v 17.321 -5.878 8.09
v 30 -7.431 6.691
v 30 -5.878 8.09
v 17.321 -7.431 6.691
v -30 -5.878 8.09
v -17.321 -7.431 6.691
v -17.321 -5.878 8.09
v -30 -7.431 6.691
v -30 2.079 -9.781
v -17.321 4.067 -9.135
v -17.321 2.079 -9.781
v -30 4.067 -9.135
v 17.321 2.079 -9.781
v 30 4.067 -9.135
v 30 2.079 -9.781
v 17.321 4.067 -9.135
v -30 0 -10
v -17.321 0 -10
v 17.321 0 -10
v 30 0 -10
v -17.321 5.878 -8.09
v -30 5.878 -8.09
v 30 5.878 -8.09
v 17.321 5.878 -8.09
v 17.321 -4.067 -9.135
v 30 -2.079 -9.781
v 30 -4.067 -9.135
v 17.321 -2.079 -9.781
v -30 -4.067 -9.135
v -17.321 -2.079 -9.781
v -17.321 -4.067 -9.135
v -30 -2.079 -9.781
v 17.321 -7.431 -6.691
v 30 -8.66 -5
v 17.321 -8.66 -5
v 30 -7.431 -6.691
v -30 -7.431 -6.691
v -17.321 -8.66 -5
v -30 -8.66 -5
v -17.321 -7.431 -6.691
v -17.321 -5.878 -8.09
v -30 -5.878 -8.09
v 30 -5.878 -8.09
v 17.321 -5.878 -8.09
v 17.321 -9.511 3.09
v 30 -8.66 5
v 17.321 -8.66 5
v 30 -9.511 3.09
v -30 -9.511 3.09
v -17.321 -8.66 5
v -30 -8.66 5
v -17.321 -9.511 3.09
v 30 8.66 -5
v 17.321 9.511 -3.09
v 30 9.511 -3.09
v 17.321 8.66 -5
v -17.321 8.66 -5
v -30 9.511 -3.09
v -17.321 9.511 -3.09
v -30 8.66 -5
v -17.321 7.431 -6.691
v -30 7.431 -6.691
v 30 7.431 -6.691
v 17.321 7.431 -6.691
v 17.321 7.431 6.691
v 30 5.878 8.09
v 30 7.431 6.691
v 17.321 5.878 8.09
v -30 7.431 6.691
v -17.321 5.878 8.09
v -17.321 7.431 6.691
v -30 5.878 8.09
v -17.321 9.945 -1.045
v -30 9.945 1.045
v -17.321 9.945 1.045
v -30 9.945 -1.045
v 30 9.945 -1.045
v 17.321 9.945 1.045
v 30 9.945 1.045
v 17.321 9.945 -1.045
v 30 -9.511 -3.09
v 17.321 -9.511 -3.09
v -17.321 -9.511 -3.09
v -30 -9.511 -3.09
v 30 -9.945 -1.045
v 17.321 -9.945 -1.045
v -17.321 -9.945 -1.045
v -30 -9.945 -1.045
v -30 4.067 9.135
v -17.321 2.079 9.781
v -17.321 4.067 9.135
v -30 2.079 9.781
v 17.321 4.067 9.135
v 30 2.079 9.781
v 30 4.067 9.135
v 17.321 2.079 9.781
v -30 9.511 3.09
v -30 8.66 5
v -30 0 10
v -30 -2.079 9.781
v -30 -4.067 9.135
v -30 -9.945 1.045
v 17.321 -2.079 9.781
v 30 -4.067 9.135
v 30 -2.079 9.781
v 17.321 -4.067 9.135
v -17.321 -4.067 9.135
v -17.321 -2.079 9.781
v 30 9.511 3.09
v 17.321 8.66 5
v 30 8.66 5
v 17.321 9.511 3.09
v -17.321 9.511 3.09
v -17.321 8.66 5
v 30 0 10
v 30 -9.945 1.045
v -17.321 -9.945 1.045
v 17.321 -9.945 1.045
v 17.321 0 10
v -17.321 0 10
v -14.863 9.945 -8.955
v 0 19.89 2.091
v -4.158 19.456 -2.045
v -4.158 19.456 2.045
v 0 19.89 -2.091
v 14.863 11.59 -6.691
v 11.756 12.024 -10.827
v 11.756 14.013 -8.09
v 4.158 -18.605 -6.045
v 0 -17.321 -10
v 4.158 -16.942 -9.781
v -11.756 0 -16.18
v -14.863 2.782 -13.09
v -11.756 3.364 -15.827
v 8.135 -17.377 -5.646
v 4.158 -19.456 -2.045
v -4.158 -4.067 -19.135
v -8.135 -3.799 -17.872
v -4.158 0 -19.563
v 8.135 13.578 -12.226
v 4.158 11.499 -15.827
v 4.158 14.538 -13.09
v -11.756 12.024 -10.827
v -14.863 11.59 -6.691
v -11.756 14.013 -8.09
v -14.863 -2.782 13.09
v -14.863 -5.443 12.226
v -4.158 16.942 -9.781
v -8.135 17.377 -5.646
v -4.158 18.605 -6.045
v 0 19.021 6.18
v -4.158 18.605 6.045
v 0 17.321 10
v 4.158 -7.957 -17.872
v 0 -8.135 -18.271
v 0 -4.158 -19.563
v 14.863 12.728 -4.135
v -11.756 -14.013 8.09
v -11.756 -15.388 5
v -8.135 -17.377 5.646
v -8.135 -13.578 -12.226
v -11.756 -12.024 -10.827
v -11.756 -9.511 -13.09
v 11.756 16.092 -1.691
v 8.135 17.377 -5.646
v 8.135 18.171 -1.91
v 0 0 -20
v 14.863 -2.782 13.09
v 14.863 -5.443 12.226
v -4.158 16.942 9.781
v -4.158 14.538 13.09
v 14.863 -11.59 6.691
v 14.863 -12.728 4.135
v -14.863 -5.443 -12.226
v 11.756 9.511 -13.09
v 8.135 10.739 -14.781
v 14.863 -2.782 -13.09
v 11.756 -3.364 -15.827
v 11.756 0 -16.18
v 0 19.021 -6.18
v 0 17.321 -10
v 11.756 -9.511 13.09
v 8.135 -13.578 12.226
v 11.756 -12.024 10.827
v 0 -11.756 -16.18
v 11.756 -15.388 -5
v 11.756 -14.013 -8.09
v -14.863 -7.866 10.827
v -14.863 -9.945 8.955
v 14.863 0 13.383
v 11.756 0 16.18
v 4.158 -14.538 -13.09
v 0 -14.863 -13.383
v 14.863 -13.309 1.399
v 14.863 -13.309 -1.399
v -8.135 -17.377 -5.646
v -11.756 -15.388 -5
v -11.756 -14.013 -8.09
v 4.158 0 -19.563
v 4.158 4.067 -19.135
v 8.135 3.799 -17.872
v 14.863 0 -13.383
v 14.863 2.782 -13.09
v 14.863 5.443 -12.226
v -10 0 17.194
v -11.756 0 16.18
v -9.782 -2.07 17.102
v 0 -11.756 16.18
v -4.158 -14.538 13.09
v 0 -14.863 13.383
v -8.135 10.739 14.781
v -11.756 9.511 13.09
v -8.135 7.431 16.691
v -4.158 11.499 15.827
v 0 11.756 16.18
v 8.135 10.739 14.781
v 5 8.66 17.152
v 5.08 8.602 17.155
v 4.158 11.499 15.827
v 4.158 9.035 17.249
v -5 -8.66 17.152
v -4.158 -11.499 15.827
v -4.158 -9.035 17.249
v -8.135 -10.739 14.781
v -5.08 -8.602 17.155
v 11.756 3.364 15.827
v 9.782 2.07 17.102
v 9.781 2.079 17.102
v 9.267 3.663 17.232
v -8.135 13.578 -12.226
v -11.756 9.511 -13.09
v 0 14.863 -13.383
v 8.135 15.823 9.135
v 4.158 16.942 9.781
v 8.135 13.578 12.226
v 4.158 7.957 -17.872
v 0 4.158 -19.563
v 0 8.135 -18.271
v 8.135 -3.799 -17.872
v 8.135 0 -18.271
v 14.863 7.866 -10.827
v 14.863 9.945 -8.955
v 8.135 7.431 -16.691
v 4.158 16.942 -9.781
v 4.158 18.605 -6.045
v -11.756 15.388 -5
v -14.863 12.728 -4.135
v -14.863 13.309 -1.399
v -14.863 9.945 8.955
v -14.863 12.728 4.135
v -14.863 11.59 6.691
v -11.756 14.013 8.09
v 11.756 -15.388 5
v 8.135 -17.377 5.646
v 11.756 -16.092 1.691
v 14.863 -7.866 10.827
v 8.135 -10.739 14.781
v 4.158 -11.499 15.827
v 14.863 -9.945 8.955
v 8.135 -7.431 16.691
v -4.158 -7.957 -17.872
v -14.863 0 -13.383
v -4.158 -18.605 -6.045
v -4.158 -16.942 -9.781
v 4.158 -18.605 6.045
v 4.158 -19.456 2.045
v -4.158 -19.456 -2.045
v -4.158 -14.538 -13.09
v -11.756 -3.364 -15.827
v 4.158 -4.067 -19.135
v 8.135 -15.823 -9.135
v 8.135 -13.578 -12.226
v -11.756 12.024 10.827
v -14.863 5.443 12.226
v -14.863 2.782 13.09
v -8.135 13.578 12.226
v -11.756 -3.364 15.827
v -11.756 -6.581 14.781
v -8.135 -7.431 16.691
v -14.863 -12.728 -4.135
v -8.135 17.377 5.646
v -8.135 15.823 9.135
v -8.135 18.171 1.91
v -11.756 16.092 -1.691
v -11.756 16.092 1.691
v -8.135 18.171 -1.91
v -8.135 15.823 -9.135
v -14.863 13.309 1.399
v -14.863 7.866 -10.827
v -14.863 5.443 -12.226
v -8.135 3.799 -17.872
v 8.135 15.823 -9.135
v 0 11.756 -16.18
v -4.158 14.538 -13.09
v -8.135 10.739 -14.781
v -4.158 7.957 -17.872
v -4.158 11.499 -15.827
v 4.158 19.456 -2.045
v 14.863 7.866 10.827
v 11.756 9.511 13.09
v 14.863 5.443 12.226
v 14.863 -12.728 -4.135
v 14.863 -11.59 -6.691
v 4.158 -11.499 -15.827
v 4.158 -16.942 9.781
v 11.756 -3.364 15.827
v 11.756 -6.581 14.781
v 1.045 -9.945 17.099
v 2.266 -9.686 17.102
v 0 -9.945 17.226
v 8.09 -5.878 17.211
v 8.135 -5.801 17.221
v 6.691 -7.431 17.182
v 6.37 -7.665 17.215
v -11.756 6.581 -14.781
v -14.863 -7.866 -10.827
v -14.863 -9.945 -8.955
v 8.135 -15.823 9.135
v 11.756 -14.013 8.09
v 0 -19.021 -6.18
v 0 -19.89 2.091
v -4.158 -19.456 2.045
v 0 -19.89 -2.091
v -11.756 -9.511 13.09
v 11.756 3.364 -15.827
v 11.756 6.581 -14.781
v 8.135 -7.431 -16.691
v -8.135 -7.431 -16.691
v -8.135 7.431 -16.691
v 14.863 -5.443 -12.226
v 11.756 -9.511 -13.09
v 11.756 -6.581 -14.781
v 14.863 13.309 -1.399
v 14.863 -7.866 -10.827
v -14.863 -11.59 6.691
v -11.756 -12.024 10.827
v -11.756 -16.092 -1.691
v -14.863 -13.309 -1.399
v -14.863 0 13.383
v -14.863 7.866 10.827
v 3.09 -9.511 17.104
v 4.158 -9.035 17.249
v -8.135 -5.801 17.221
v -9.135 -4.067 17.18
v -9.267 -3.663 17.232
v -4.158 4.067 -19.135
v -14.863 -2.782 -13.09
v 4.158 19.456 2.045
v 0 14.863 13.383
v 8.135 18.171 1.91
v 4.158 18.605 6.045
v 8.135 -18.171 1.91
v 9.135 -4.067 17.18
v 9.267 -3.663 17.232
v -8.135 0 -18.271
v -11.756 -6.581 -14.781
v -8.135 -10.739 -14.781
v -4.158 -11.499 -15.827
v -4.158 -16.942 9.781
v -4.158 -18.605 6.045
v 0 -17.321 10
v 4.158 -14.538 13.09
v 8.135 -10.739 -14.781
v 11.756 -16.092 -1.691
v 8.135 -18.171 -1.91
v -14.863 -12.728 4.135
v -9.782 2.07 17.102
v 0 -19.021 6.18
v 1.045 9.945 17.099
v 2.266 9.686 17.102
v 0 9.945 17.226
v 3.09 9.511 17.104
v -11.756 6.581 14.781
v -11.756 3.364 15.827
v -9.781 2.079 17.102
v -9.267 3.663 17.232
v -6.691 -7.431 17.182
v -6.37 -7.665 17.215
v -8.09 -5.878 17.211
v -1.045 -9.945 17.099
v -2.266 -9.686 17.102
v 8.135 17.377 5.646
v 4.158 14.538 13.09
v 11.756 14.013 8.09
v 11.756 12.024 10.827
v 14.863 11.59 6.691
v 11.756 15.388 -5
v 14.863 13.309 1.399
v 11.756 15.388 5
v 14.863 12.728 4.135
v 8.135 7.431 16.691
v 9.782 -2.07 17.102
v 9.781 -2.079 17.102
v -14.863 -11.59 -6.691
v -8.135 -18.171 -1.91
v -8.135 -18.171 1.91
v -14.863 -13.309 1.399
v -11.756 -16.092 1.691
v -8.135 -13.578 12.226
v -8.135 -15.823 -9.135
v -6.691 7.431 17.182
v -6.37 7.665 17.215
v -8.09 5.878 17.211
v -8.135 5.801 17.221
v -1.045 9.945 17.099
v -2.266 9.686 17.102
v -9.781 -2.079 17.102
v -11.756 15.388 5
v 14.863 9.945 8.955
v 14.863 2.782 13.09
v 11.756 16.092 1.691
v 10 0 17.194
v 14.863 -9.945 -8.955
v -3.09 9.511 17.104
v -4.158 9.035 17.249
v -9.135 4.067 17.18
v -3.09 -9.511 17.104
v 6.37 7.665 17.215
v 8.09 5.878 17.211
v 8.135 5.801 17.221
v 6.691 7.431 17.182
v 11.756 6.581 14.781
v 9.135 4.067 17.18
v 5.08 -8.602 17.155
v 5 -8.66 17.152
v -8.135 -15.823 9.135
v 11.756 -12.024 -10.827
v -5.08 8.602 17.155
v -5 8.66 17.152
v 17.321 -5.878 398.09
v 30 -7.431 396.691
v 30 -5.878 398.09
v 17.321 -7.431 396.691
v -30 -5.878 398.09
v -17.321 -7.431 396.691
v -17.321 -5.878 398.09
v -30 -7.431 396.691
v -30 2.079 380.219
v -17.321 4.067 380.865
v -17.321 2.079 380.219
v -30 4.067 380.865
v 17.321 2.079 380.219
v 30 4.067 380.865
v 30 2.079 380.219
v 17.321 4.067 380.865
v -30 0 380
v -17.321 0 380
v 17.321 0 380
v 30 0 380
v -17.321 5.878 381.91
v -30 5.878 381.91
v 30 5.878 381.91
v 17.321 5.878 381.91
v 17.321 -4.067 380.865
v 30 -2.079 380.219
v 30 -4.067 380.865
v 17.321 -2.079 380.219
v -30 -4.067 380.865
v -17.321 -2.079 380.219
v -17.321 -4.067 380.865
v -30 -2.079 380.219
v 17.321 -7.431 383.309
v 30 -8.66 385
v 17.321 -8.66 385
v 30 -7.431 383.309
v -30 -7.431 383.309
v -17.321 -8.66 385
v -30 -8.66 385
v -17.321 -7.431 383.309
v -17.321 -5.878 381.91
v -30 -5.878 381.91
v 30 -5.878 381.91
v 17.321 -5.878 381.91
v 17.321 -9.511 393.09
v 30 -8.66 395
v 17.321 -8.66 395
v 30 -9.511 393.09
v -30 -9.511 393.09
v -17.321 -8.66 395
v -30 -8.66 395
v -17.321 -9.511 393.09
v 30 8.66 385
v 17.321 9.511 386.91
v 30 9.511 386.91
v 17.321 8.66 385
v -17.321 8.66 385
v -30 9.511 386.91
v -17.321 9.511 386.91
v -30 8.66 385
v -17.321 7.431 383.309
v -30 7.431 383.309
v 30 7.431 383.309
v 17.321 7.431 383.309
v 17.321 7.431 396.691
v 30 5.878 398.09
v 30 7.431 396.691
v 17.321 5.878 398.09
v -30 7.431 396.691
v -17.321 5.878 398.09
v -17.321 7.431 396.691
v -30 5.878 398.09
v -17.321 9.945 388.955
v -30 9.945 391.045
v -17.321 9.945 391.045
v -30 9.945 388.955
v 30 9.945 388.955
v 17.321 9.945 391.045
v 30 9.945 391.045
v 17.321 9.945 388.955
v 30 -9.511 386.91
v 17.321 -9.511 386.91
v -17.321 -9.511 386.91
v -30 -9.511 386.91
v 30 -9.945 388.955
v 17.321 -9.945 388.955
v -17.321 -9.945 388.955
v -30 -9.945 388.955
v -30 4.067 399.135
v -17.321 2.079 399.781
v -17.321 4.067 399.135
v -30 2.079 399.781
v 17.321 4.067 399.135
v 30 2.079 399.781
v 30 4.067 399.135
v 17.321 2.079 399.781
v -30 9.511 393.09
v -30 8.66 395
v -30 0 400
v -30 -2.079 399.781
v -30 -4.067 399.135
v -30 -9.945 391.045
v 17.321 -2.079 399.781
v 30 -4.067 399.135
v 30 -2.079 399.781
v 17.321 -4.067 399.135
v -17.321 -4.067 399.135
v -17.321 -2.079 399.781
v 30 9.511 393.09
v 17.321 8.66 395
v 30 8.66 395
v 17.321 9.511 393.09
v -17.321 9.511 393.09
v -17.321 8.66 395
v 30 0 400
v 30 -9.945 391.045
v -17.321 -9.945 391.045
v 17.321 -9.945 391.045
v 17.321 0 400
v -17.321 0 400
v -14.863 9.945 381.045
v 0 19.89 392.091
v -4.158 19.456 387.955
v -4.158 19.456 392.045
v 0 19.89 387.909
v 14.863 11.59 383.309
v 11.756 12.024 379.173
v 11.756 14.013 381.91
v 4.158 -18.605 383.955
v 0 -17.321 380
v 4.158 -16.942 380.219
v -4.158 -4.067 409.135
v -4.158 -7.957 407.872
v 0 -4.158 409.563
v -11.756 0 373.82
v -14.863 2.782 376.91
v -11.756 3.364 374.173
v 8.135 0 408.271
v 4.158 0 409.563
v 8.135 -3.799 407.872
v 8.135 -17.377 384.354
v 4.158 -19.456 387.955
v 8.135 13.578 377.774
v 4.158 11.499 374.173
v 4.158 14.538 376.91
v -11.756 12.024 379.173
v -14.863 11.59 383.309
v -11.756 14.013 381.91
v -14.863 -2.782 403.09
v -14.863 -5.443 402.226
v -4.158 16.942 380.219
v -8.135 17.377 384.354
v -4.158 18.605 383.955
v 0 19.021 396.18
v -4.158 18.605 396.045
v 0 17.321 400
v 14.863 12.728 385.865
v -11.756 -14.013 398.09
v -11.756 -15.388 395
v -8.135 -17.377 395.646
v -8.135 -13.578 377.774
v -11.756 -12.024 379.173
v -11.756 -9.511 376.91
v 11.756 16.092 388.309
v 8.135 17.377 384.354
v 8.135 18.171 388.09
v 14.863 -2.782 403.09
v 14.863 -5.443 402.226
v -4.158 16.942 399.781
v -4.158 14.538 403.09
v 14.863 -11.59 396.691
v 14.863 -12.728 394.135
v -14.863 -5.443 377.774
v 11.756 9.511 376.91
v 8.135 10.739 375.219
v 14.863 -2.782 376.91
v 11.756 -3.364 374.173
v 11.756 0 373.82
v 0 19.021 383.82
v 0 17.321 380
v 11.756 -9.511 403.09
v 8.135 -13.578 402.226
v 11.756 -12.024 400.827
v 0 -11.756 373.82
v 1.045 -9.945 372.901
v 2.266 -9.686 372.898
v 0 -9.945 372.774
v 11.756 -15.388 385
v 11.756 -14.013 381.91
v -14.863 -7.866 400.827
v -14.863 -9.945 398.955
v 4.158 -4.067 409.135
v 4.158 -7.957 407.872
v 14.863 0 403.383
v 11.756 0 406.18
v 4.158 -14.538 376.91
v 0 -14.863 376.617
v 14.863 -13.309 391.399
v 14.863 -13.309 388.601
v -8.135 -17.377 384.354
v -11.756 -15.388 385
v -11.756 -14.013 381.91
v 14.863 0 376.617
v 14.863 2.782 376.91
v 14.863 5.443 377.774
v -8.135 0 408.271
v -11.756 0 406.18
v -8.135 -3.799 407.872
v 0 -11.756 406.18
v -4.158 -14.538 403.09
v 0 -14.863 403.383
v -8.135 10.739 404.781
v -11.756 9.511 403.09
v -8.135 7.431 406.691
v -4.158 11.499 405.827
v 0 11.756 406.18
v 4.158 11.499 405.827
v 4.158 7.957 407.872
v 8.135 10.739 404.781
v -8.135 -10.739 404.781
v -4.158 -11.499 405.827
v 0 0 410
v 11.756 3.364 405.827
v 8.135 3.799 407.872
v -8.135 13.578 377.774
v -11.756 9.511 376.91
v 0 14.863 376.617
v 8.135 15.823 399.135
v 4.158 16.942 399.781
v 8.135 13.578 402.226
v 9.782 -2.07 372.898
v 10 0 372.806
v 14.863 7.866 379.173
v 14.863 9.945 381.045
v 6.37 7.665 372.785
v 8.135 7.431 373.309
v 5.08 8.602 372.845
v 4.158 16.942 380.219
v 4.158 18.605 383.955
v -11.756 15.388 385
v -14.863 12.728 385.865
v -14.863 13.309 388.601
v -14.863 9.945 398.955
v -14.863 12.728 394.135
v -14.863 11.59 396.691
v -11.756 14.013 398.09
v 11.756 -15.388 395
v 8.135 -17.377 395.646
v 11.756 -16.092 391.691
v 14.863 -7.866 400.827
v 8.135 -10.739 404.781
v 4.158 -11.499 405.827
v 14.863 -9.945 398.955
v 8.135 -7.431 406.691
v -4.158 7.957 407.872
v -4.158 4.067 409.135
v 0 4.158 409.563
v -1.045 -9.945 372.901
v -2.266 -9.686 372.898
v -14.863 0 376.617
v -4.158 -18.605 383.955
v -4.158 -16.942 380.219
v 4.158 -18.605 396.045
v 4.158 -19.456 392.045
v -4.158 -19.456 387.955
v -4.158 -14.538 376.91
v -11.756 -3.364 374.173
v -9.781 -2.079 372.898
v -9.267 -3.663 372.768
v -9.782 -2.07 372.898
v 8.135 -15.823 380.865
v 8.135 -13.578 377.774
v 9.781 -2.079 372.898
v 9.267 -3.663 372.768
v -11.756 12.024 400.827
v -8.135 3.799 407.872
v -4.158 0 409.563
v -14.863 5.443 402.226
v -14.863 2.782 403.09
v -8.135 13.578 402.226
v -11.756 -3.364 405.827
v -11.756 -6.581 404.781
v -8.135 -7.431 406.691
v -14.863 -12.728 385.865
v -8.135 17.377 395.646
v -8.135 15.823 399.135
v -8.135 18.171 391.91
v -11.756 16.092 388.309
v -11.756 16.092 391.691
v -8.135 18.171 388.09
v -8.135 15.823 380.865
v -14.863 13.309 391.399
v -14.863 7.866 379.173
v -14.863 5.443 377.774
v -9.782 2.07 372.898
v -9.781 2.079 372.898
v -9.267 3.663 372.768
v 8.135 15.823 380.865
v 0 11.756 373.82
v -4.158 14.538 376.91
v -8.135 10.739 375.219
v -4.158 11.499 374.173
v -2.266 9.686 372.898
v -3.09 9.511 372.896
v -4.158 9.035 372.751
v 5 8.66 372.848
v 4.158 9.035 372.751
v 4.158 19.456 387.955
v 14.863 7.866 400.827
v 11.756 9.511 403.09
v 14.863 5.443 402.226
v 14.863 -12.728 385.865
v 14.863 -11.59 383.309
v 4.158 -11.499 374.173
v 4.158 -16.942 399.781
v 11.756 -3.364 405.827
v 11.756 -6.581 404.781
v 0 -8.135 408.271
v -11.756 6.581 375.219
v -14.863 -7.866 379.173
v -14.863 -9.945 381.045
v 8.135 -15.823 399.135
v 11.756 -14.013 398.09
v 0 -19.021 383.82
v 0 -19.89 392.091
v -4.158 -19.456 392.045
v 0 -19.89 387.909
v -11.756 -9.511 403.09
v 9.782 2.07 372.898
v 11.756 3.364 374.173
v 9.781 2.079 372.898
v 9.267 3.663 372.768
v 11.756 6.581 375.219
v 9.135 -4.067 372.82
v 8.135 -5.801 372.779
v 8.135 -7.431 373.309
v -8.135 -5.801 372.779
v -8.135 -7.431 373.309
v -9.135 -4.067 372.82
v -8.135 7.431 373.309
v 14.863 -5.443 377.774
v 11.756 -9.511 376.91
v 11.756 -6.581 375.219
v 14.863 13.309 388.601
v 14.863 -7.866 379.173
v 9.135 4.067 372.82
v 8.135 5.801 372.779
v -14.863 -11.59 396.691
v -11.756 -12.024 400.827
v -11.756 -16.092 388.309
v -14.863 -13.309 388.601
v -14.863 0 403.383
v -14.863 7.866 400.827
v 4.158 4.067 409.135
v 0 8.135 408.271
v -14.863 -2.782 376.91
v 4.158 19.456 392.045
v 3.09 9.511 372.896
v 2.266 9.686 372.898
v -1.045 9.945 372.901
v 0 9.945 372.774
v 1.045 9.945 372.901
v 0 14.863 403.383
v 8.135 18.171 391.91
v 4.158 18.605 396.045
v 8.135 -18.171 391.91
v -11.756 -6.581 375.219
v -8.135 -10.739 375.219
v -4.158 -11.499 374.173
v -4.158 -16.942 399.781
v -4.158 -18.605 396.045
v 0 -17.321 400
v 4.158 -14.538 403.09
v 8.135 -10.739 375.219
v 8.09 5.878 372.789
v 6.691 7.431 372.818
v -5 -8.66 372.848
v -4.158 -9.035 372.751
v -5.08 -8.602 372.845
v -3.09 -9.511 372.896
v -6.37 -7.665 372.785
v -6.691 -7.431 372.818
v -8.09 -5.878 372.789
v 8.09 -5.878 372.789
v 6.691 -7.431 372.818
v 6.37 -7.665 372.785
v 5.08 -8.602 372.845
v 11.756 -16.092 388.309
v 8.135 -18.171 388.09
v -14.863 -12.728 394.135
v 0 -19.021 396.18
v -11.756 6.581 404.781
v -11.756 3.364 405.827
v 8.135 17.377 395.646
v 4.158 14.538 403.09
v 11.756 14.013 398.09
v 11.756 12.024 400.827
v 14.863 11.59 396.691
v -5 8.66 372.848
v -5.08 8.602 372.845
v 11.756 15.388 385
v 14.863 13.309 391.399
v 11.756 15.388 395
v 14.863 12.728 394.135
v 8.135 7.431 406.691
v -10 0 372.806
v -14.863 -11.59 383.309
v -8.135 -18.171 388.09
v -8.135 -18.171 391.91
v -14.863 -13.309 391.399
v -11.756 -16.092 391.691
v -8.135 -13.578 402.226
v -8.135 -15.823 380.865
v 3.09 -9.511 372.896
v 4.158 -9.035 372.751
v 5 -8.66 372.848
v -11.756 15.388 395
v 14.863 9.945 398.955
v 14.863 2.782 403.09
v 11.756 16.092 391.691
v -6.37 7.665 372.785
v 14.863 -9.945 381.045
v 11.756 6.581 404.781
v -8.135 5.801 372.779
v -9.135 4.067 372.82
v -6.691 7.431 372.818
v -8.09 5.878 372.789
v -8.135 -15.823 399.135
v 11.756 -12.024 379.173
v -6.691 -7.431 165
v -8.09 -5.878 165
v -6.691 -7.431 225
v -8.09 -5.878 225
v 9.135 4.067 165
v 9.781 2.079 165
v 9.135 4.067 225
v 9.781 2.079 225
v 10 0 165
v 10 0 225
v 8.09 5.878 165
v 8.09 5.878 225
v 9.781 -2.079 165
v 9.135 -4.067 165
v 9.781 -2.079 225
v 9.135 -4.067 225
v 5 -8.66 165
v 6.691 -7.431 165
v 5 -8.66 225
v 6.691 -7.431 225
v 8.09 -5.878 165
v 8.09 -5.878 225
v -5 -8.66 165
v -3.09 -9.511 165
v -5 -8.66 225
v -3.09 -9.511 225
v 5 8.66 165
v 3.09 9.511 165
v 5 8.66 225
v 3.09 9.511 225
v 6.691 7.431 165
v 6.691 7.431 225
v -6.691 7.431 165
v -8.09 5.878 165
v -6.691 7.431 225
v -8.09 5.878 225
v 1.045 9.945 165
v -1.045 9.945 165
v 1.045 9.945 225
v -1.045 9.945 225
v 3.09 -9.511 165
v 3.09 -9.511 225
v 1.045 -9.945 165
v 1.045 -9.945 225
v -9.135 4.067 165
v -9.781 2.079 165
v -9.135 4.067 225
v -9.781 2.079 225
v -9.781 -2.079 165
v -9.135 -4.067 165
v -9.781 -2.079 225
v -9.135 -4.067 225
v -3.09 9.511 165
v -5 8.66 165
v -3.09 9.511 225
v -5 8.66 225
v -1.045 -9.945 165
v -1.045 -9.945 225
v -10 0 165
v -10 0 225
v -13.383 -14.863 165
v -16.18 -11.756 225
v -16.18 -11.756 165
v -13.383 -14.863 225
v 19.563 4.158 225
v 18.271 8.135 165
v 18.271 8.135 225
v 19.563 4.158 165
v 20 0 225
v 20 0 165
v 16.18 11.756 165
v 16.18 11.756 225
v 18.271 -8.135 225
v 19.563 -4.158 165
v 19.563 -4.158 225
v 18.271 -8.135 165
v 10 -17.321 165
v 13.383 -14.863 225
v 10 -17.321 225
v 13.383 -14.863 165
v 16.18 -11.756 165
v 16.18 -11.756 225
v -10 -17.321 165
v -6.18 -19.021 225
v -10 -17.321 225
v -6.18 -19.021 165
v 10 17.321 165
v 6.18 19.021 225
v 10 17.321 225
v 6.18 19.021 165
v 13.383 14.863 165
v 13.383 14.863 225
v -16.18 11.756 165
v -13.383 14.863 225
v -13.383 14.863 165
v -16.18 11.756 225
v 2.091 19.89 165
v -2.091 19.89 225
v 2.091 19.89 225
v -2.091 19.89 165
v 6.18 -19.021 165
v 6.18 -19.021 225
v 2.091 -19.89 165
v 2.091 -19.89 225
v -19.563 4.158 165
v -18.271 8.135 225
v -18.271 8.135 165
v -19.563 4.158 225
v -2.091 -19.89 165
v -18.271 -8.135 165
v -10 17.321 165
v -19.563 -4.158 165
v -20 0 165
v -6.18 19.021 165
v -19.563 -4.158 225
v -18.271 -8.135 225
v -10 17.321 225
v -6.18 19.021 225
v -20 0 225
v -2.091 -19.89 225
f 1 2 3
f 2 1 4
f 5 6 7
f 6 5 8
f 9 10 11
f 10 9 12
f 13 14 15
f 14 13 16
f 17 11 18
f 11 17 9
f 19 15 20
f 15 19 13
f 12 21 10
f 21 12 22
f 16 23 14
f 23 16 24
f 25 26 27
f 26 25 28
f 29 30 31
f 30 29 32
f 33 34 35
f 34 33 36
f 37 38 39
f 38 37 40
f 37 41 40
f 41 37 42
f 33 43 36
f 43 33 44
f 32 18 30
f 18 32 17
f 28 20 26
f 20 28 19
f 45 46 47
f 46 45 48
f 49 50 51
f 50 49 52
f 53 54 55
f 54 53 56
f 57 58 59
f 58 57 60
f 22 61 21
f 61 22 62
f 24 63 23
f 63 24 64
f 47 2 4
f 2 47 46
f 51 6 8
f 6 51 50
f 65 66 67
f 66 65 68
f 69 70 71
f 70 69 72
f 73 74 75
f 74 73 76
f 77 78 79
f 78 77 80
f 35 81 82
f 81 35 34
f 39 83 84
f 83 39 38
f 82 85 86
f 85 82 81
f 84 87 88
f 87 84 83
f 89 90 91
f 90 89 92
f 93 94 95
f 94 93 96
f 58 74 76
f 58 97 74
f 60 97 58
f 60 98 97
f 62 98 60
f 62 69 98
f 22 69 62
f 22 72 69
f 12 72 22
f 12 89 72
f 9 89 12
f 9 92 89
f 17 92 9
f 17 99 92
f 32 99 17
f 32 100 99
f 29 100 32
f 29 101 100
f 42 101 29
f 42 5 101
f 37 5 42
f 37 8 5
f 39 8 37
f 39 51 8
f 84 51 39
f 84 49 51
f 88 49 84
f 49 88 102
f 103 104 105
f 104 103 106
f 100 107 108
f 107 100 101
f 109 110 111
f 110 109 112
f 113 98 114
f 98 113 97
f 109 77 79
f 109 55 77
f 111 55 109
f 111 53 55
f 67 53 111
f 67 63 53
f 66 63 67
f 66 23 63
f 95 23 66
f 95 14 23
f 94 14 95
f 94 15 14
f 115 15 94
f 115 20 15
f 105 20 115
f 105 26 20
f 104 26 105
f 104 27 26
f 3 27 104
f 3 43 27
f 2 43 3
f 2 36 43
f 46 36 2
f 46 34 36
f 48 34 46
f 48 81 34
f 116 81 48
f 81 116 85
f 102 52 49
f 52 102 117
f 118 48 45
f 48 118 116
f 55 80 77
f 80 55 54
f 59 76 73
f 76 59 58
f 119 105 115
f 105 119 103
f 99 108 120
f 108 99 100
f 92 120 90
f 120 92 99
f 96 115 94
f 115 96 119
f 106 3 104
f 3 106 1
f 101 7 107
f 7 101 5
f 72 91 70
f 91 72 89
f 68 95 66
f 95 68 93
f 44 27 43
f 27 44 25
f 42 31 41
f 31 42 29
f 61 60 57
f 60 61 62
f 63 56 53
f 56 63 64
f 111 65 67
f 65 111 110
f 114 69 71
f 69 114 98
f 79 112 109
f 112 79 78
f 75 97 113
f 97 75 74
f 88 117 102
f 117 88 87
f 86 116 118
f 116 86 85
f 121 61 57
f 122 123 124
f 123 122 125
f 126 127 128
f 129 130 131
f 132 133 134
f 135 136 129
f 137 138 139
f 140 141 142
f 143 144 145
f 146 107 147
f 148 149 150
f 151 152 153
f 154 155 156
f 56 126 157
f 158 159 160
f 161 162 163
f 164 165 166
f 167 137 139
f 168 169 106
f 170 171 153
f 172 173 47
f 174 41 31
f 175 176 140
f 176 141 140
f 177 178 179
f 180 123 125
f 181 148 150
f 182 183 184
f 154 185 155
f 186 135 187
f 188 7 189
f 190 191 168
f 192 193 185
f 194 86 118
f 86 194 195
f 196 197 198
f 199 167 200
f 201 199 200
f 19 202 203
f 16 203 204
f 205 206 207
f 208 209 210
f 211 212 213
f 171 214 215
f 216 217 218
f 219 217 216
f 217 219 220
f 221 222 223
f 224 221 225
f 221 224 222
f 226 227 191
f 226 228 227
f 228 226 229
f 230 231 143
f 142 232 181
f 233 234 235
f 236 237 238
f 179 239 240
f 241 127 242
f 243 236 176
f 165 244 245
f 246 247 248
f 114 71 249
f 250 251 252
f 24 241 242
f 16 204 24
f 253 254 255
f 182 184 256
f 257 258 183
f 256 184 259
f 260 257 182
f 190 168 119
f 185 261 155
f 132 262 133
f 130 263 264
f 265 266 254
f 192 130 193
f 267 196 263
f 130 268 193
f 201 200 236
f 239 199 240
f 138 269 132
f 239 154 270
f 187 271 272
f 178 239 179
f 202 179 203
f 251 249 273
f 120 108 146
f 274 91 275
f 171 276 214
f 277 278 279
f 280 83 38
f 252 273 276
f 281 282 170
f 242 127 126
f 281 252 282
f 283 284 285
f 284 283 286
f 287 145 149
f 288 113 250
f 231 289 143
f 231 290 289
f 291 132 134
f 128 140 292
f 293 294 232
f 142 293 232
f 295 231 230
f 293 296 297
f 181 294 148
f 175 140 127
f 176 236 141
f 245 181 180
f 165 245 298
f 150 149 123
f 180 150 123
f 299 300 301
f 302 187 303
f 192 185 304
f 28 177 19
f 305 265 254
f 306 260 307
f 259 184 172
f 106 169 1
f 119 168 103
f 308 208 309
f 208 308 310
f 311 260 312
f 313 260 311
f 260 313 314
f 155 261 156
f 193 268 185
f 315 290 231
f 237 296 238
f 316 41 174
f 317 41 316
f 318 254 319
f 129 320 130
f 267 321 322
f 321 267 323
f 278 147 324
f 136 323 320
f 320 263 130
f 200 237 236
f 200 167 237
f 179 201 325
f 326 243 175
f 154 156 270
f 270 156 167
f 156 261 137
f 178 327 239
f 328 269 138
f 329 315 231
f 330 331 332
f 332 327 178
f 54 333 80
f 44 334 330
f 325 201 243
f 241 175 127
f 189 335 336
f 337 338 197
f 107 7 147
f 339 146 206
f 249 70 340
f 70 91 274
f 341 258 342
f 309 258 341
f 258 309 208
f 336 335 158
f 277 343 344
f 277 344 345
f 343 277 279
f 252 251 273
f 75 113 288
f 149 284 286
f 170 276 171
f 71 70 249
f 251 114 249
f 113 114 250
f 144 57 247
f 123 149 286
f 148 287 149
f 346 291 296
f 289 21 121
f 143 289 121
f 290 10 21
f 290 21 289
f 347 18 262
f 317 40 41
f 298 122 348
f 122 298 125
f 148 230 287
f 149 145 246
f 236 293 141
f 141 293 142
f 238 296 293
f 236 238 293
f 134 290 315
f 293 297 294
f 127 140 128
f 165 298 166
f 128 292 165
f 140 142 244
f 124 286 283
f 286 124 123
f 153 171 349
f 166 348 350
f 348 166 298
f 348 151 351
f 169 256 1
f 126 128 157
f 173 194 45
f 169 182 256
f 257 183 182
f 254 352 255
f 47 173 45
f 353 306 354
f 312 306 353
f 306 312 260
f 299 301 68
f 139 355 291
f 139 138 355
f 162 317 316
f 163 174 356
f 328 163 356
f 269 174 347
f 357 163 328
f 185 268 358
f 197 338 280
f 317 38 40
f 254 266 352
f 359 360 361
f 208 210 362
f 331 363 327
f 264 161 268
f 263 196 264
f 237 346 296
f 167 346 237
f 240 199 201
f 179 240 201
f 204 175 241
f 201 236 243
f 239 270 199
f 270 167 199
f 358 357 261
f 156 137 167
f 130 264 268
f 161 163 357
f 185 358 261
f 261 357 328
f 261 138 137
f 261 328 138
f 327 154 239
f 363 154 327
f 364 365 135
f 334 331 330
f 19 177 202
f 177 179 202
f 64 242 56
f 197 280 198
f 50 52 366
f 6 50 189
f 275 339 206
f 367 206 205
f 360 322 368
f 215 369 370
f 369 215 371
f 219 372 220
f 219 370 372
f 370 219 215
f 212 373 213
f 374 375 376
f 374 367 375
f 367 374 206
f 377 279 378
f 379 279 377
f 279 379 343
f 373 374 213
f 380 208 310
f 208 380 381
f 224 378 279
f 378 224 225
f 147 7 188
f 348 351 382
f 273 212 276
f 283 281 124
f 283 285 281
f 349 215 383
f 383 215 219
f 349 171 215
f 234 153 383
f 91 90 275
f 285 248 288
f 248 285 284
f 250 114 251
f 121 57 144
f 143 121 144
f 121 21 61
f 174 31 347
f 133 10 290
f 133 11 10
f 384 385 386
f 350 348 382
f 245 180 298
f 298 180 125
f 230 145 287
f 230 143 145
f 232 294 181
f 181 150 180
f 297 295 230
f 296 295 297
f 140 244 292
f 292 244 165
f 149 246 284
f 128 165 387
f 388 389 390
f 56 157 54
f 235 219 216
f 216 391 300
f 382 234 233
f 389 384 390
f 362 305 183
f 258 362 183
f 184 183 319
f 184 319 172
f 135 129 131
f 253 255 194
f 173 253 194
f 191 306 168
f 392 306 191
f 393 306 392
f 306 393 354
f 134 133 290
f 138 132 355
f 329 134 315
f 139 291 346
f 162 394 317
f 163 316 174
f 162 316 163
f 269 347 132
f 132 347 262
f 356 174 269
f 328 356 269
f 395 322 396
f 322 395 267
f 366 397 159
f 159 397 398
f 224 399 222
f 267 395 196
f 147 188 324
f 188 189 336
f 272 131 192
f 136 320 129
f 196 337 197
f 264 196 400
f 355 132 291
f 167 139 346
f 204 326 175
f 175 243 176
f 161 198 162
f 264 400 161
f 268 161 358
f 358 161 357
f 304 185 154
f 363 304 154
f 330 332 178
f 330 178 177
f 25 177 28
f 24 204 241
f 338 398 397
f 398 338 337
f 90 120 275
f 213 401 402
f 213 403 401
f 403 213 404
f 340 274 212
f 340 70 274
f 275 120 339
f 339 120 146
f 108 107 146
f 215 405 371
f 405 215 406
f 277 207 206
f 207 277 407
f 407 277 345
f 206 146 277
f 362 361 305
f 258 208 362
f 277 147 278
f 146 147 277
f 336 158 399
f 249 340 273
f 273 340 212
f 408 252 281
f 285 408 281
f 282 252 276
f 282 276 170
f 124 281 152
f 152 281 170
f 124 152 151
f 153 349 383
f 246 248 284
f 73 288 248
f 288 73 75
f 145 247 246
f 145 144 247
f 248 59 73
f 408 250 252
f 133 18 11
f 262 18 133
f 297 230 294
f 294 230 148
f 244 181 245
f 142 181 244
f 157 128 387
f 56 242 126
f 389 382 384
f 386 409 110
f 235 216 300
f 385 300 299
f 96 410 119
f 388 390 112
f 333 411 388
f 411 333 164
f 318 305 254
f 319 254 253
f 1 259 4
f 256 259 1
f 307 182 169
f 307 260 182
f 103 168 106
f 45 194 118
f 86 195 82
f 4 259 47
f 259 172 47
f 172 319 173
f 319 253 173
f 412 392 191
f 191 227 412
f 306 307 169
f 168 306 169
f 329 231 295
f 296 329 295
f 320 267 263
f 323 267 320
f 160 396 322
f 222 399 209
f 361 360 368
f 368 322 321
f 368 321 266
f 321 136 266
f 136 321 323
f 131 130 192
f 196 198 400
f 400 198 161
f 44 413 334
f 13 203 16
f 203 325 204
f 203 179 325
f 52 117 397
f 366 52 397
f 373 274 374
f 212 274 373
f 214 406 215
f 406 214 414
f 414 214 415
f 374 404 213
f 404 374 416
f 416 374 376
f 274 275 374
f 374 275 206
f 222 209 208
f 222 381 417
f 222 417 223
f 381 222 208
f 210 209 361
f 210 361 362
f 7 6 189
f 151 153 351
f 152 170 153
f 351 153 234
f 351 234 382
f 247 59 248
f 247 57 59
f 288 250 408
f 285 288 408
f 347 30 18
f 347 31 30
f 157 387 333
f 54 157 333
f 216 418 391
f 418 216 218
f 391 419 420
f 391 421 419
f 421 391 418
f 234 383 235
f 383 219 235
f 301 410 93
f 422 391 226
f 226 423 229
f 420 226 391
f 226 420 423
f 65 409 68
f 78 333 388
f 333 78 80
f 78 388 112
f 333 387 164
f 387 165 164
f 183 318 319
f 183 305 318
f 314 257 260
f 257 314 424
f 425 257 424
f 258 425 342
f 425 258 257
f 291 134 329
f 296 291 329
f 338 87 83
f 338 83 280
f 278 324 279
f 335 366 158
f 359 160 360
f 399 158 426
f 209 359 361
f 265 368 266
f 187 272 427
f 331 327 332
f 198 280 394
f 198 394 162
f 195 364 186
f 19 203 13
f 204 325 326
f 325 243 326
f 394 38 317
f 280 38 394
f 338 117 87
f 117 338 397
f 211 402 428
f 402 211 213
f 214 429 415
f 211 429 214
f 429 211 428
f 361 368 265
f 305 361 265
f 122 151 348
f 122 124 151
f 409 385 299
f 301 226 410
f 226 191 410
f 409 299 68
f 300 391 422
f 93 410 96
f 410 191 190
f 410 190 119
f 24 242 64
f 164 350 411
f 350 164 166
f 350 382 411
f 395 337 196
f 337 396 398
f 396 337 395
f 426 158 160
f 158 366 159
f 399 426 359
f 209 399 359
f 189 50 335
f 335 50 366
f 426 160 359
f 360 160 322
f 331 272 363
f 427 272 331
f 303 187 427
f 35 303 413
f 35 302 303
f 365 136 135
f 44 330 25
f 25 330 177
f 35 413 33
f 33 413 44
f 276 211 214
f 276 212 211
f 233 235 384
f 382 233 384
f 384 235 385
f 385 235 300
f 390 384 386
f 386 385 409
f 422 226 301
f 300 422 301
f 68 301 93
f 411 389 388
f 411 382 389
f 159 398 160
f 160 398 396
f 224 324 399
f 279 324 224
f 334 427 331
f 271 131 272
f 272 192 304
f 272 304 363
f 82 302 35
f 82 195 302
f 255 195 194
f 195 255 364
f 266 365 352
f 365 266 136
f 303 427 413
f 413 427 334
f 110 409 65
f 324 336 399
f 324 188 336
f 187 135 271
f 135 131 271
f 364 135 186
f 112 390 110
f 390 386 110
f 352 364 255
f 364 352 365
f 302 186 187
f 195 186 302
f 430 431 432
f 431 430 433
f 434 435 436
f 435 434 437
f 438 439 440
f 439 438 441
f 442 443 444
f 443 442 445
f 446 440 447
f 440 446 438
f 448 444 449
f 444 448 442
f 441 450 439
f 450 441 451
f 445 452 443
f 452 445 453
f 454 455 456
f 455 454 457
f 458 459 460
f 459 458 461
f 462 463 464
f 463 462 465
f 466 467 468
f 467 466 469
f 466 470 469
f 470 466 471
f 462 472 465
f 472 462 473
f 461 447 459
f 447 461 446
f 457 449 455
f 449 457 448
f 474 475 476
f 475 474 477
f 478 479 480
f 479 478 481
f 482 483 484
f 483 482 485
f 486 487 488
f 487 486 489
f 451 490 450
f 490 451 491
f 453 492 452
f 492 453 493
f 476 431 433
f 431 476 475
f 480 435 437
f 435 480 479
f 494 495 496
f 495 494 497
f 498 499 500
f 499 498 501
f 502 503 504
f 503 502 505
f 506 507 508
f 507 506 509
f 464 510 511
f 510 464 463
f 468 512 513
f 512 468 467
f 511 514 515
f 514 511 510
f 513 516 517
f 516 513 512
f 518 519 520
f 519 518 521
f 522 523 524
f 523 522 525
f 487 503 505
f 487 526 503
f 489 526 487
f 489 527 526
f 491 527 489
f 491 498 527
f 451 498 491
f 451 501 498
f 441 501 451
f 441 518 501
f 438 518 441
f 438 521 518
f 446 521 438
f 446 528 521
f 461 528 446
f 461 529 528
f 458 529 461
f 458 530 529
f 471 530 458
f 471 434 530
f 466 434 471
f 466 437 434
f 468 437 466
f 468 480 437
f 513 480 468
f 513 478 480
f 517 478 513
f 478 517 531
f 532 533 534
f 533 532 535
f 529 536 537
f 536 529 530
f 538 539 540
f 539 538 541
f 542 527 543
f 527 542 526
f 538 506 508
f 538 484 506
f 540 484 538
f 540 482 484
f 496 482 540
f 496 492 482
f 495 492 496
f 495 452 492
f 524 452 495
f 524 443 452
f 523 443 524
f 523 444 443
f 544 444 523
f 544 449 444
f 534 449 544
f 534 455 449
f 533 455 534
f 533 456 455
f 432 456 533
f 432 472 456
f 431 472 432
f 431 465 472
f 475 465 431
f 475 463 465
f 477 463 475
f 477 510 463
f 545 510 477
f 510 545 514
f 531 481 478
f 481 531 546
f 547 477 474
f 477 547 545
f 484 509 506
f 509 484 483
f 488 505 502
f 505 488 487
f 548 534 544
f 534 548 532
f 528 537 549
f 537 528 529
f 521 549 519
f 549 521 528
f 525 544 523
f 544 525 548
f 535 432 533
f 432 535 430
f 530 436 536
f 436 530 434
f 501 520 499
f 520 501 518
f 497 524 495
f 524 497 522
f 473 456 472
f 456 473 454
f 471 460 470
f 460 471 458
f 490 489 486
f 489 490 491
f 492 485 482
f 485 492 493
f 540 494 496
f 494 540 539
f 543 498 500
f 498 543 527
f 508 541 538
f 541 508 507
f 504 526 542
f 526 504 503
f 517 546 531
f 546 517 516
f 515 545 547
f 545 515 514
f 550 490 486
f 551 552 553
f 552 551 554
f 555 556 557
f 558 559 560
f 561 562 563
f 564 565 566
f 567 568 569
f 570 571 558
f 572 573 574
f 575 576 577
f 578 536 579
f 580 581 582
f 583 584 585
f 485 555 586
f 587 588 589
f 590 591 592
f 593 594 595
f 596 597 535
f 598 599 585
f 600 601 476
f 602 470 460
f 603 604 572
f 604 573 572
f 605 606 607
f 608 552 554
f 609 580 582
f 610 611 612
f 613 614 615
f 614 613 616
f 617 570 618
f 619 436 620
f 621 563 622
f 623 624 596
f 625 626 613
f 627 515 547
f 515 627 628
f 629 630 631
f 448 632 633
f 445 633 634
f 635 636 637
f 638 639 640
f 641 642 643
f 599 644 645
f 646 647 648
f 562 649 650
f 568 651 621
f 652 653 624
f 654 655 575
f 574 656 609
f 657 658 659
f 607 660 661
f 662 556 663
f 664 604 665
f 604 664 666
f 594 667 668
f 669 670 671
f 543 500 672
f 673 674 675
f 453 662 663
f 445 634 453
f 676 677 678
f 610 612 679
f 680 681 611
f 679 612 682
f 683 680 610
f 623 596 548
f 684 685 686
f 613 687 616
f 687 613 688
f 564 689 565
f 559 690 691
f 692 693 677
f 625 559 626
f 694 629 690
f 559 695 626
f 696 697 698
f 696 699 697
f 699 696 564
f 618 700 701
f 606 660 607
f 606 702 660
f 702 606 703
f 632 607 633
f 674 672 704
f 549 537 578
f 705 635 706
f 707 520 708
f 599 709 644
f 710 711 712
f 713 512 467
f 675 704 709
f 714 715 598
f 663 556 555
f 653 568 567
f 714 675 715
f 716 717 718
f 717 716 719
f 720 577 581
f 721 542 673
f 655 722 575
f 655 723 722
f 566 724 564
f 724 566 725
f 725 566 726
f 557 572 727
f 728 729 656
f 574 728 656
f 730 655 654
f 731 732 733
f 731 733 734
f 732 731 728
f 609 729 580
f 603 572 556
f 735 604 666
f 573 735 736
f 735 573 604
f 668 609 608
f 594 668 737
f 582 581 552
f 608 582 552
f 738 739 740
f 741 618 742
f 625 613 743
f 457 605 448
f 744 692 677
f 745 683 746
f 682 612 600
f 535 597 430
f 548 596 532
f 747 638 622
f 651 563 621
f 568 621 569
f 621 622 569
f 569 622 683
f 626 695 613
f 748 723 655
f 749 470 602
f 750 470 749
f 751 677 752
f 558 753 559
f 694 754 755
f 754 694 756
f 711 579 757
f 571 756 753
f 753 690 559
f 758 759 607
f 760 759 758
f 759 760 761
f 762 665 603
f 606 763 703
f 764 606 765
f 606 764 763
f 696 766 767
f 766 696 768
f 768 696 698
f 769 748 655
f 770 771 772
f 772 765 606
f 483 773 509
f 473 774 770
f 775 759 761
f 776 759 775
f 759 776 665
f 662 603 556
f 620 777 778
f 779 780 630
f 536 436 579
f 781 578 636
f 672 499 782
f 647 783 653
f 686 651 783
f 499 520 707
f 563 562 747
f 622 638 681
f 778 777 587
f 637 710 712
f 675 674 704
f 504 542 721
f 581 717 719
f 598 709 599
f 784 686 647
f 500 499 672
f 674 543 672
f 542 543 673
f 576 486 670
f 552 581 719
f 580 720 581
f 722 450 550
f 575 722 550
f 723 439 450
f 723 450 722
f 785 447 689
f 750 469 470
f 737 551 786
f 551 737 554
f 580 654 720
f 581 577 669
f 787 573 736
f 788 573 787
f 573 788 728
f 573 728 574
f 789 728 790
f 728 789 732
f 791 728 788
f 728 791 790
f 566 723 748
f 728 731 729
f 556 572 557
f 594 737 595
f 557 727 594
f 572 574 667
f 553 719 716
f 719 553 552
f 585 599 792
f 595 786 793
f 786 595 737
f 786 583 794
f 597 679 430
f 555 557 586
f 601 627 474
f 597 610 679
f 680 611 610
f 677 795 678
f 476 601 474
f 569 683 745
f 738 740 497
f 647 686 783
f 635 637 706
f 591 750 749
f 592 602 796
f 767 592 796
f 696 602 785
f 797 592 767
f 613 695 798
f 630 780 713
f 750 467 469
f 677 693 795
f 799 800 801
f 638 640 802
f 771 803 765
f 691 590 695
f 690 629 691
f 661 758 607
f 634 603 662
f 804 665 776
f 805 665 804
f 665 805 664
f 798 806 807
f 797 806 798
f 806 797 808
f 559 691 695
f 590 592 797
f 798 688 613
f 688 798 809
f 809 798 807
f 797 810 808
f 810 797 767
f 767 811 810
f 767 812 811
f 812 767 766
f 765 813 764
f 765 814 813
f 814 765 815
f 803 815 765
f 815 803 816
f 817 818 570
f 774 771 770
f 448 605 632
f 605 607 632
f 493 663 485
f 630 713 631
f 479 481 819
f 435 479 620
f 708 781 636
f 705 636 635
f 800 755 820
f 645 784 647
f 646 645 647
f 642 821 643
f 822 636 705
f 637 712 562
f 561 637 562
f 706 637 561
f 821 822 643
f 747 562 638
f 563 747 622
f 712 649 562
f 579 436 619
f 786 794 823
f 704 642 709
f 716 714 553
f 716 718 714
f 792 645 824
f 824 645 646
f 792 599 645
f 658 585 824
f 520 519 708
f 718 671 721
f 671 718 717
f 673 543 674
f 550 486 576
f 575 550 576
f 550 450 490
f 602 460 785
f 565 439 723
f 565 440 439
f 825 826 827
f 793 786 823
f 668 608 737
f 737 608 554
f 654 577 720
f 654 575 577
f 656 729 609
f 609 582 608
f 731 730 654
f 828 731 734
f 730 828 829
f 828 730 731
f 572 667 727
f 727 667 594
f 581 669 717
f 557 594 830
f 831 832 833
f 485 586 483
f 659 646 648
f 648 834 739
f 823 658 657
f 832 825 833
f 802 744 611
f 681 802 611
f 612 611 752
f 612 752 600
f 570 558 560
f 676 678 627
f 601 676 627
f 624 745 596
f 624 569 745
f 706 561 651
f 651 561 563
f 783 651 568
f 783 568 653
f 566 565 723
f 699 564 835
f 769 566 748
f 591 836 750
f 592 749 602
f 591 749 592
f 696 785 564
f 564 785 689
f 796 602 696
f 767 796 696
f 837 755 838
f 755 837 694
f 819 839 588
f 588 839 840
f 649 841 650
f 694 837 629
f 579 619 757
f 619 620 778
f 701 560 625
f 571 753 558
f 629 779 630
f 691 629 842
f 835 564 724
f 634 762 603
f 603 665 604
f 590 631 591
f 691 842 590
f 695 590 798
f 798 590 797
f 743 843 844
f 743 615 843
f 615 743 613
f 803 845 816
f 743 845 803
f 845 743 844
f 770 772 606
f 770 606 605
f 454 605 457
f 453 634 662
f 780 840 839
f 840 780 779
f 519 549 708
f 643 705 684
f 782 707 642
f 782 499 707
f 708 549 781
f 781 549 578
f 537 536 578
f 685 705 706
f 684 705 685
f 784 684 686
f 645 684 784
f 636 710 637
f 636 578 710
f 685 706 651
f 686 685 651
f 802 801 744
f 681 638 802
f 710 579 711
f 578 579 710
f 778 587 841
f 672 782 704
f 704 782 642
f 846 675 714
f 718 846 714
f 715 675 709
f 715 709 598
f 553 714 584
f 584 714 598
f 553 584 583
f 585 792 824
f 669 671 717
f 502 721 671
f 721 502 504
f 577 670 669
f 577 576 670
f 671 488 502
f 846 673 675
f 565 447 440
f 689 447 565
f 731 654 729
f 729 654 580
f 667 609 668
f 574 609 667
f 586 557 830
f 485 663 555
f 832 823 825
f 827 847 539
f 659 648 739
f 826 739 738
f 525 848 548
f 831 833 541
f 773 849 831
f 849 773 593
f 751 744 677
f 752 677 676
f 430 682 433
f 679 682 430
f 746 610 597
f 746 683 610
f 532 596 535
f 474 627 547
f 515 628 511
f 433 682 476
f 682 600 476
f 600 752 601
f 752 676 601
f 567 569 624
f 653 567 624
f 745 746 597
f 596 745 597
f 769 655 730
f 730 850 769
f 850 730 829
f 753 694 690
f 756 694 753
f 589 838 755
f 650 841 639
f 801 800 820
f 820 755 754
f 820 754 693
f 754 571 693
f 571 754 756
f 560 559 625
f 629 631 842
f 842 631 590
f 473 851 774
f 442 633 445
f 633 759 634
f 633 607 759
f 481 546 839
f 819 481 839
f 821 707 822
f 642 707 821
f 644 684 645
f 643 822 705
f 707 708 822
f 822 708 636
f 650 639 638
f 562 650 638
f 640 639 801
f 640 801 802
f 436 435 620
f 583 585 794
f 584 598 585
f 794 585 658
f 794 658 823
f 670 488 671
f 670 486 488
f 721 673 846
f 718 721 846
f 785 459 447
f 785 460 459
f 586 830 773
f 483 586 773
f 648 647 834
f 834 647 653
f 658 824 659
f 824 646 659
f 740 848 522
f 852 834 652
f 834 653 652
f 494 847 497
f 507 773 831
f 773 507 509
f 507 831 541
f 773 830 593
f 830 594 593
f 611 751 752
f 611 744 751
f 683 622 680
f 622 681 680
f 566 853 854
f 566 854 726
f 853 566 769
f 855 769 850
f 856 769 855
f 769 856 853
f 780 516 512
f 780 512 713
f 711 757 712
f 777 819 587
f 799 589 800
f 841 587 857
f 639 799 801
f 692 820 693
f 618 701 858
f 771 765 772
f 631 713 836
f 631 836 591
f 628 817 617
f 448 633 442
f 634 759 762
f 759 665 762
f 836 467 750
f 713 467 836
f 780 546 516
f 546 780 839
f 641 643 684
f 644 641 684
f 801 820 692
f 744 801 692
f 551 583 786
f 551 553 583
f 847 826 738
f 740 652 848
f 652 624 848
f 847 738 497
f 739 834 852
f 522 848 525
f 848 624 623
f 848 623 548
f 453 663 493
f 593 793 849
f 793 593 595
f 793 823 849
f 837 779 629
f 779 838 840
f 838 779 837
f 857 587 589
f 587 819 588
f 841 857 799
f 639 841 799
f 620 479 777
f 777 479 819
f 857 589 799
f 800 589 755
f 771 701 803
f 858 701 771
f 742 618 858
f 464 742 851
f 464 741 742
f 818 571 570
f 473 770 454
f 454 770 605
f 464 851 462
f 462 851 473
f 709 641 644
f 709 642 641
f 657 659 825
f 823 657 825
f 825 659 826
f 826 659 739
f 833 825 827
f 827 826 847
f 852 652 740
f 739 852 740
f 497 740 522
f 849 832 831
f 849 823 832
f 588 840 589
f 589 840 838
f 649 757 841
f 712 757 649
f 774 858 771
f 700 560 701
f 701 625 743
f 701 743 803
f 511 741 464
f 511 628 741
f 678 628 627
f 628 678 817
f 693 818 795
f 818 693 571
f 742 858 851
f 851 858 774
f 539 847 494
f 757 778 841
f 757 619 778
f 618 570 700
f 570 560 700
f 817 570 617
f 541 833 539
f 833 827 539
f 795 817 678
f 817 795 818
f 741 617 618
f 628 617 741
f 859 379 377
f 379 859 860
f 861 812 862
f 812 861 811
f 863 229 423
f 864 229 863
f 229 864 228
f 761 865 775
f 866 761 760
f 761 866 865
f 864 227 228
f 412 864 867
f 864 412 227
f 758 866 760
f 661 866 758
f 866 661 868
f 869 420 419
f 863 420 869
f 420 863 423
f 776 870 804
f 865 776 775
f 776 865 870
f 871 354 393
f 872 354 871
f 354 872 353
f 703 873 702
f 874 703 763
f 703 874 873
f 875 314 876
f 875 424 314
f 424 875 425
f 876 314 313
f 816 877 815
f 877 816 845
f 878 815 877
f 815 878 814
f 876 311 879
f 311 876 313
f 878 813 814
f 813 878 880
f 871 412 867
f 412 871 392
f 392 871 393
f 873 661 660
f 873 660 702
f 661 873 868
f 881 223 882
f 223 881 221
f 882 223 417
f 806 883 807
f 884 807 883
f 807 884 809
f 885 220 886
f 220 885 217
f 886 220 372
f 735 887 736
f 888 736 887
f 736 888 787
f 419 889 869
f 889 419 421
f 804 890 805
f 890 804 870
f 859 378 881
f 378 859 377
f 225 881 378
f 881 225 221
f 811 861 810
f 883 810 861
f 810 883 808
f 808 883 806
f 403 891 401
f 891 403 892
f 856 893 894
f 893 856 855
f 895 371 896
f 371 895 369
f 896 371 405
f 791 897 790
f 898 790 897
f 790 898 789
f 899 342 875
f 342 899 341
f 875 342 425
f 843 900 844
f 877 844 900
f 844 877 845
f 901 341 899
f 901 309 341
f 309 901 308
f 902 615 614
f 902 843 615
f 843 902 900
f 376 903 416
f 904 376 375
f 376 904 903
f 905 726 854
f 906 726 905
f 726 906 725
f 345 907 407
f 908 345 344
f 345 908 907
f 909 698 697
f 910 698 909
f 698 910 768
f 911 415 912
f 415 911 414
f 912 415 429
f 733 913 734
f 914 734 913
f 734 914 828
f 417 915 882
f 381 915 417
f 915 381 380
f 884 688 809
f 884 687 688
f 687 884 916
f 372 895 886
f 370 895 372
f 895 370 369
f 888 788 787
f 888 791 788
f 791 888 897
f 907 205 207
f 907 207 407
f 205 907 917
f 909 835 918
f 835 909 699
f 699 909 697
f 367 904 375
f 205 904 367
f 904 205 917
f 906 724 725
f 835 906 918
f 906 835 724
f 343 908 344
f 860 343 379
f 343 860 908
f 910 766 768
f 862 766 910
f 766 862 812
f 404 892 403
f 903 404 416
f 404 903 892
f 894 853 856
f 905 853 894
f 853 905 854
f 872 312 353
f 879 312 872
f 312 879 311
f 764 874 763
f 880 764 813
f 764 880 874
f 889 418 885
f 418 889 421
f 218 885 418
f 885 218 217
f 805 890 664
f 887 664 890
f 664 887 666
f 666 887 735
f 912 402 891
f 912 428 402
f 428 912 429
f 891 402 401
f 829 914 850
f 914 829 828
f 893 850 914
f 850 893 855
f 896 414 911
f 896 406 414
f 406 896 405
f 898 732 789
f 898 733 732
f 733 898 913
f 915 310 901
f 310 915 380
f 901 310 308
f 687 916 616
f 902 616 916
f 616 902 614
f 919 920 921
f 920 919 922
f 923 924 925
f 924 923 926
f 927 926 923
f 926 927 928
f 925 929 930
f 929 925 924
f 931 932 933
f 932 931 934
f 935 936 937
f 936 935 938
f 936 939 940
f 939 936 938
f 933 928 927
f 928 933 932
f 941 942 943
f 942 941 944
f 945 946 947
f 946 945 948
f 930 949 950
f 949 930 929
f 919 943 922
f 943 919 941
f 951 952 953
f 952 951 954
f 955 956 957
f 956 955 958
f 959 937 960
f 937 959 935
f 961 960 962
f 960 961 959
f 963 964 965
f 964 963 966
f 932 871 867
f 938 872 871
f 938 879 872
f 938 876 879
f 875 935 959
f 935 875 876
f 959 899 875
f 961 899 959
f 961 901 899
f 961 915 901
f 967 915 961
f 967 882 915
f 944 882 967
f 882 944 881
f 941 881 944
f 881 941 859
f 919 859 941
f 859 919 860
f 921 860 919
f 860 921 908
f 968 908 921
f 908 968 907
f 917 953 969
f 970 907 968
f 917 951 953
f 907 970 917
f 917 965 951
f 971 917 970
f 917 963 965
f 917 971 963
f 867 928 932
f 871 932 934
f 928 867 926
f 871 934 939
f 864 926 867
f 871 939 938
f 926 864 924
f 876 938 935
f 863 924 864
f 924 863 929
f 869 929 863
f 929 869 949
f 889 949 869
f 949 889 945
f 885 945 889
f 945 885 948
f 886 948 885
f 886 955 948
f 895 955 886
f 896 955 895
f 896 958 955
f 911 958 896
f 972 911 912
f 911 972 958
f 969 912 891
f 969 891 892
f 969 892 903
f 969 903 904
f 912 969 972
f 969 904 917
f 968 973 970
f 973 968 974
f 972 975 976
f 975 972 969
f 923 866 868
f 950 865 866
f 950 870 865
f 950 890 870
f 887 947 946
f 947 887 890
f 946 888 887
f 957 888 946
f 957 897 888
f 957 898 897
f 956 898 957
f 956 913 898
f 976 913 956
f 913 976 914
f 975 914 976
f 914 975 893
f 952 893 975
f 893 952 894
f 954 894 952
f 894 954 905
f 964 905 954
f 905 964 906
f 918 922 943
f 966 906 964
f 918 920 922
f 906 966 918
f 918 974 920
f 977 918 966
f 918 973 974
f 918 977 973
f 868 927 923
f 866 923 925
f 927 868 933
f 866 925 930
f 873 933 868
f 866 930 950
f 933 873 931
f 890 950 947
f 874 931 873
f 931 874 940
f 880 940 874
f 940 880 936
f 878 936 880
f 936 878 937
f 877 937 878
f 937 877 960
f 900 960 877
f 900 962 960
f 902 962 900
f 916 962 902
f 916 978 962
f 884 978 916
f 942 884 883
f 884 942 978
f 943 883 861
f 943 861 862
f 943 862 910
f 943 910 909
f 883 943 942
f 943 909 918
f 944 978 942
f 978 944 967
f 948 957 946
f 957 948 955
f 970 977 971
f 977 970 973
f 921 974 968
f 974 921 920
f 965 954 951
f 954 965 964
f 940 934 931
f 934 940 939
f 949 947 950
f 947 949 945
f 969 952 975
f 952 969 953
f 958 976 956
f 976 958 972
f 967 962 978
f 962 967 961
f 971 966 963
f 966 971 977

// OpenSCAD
// CSG.scad - Basic example of CSG usage

lenght = 390;
angle = 0;


union(){
    head_1();
    cyl_1();
    cyl_2();
     head_2();
}



 module head_1(){   rotate([0,90,0]) union() {
        cylinder(h = 60, r = 10,center=true);
        sphere(r = 20);
    }
}

module cyl_1(){
    cylinder(h = (lenght), r = 10, center = false);
}

module cyl_2(){
    translate([0,0,lenght/2])
    cylinder(h = 60, r = 20, center = true);
}



 module head_2(){
     
    translate([00,0,lenght])
     rotate([0,90,angle])
     union() {
        cylinder(h = 60, r = 10,center=true);
        sphere(r = 20);
    }
}

echo(version=version());
// Written by Marius Kintel <marius@kintel.net>
//
// To the extent possible under law, the author(s) have dedicated all
// copyright and related and neighboring rights to this software to the
// public domain worldwide. This software is distributed without any
// warranty.
//
// You should have received a copy of the CC0 Public Domain
// Dedication along with this software.
// If not, see <http://creativecommons.org/publicdomain/zero/1.0/>.
